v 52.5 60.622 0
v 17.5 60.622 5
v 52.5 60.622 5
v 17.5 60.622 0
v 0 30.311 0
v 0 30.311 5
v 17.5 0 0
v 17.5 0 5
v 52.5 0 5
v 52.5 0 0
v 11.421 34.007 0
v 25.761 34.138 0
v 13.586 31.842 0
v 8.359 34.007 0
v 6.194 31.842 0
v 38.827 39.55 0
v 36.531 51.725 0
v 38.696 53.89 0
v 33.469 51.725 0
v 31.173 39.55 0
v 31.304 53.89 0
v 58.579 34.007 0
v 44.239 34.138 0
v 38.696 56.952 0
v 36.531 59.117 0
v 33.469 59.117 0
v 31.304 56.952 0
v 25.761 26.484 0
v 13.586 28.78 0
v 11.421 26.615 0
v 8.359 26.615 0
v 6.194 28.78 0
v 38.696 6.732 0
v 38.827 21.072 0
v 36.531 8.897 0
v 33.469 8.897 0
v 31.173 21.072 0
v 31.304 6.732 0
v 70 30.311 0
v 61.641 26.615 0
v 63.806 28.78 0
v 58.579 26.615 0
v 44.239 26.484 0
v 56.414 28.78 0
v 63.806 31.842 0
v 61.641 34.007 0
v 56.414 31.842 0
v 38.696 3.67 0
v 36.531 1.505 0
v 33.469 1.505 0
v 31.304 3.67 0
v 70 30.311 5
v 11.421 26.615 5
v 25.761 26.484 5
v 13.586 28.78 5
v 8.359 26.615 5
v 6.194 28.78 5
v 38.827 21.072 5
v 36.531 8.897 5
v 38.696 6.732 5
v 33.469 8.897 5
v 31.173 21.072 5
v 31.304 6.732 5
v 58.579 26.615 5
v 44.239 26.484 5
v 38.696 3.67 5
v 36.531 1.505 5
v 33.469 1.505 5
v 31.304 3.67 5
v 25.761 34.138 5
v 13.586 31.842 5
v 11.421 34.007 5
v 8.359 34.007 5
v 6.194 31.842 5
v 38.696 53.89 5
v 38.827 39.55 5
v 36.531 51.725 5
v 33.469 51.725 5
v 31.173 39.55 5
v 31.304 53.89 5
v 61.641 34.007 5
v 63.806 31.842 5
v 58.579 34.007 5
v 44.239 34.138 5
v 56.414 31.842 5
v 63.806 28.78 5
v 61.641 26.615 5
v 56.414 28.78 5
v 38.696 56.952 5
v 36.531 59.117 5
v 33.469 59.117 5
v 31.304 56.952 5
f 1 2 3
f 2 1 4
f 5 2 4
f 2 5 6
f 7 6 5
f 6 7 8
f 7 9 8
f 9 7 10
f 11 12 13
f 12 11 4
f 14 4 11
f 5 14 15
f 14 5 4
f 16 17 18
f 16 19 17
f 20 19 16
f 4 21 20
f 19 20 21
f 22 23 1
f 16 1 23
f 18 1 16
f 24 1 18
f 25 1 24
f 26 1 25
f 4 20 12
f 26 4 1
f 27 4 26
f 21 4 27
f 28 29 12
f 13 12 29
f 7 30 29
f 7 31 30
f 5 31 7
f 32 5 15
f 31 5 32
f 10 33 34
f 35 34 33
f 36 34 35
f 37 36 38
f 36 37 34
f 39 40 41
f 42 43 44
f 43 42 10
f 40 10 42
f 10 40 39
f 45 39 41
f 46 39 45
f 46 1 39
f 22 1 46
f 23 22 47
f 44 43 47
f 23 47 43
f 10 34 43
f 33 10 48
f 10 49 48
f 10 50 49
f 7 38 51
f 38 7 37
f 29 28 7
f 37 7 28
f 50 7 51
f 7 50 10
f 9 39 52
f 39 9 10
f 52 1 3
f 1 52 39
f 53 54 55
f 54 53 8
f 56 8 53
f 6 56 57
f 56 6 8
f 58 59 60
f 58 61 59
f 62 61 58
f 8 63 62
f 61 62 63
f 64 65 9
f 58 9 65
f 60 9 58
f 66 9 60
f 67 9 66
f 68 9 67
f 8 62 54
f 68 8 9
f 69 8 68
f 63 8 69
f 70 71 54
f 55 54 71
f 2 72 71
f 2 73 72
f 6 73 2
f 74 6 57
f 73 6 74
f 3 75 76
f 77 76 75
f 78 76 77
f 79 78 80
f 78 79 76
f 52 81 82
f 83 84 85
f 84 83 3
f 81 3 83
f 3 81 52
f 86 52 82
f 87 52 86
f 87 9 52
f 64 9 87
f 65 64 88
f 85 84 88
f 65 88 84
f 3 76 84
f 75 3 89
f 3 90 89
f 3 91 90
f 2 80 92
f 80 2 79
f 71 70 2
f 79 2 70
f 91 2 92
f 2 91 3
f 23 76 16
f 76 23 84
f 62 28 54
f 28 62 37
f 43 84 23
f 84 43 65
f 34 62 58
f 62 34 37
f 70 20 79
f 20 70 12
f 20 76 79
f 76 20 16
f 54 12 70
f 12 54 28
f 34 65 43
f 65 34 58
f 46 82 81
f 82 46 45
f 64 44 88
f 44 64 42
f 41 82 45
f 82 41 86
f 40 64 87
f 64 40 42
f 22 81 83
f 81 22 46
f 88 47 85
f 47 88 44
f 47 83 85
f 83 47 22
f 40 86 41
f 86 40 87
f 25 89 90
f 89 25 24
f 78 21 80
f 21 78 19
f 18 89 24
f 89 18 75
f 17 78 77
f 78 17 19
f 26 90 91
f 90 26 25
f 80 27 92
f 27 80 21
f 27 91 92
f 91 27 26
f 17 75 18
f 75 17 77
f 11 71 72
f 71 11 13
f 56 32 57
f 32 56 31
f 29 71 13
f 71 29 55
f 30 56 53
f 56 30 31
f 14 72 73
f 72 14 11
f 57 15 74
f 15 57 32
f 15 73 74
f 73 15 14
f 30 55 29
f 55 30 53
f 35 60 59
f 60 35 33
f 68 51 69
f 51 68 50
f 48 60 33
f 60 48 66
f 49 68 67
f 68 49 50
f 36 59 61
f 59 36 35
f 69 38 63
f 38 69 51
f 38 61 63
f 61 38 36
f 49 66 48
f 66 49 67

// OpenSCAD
$fn = 32;

// ----------------------------------------------------------------------
// Polygon plate: 6-gon R35, 4 bolt windows
// ----------------------------------------------------------------------

// --- parameters (mm) ---
sides = 6;                // number of polygon sides
plate_r = 35;             // circumscribed radius of the polygon
bore_r = 10;              // centre bore radius
bolts = 4;                // number of bolt windows
ring_r = 25.11;           // bolt-circle radius
bolt_r = 4;               // bolt window radius
plate_t = 5;              // plate thickness, Z (extrusion height)

plate_d = 2 * plate_r;  // circumscribed diameter
bore_d = 2 * bore_r;  // centre bore diameter
bolt_d = 2 * bolt_r;  // bolt window diameter
ring_d = 2 * ring_r;  // bolt-circle diameter

profile = [[70, 30.311], [52.5, 60.622], [17.5, 60.622], [0, 30.311], [17.5, 0], [52.5, 0]];  // primary outline, 6 points, counter clockwise
void_1 = [[44.239, 34.138], [38.827, 39.55], [31.173, 39.55], [25.761, 34.138], [25.761, 26.484], [31.173, 21.072], [38.827, 21.072], [44.239, 26.484]];  // centre bore, 8 points
void_2 = [[63.806, 31.842], [61.641, 34.007], [58.579, 34.007], [56.414, 31.842], [56.414, 28.78], [58.579, 26.615], [61.641, 26.615], [63.806, 28.78]];  // bolt window 1, 8 points
void_3 = [[38.696, 56.952], [36.531, 59.117], [33.469, 59.117], [31.304, 56.952], [31.304, 53.89], [33.469, 51.725], [36.531, 51.725], [38.696, 53.89]];  // bolt window 2, 8 points
void_4 = [[13.586, 31.842], [11.421, 34.007], [8.359, 34.007], [6.194, 31.842], [6.194, 28.78], [8.359, 26.615], [11.421, 26.615], [13.586, 28.78]];  // bolt window 3, 8 points
void_5 = [[38.696, 6.732], [36.531, 8.897], [33.469, 8.897], [31.304, 6.732], [31.304, 3.67], [33.469, 1.505], [36.531, 1.505], [38.696, 3.67]];  // bolt window 4, 8 points

// --- the one profile operation ---
difference() {
  linear_extrude(height = plate_t) polygon(points = profile);
  translate([0, 0, -1])
    linear_extrude(height = plate_t + 2) polygon(points = void_1);
  translate([0, 0, -1])
    linear_extrude(height = plate_t + 2) polygon(points = void_2);
  translate([0, 0, -1])
    linear_extrude(height = plate_t + 2) polygon(points = void_3);
  translate([0, 0, -1])
    linear_extrude(height = plate_t + 2) polygon(points = void_4);
  translate([0, 0, -1])
    linear_extrude(height = plate_t + 2) polygon(points = void_5);
}
